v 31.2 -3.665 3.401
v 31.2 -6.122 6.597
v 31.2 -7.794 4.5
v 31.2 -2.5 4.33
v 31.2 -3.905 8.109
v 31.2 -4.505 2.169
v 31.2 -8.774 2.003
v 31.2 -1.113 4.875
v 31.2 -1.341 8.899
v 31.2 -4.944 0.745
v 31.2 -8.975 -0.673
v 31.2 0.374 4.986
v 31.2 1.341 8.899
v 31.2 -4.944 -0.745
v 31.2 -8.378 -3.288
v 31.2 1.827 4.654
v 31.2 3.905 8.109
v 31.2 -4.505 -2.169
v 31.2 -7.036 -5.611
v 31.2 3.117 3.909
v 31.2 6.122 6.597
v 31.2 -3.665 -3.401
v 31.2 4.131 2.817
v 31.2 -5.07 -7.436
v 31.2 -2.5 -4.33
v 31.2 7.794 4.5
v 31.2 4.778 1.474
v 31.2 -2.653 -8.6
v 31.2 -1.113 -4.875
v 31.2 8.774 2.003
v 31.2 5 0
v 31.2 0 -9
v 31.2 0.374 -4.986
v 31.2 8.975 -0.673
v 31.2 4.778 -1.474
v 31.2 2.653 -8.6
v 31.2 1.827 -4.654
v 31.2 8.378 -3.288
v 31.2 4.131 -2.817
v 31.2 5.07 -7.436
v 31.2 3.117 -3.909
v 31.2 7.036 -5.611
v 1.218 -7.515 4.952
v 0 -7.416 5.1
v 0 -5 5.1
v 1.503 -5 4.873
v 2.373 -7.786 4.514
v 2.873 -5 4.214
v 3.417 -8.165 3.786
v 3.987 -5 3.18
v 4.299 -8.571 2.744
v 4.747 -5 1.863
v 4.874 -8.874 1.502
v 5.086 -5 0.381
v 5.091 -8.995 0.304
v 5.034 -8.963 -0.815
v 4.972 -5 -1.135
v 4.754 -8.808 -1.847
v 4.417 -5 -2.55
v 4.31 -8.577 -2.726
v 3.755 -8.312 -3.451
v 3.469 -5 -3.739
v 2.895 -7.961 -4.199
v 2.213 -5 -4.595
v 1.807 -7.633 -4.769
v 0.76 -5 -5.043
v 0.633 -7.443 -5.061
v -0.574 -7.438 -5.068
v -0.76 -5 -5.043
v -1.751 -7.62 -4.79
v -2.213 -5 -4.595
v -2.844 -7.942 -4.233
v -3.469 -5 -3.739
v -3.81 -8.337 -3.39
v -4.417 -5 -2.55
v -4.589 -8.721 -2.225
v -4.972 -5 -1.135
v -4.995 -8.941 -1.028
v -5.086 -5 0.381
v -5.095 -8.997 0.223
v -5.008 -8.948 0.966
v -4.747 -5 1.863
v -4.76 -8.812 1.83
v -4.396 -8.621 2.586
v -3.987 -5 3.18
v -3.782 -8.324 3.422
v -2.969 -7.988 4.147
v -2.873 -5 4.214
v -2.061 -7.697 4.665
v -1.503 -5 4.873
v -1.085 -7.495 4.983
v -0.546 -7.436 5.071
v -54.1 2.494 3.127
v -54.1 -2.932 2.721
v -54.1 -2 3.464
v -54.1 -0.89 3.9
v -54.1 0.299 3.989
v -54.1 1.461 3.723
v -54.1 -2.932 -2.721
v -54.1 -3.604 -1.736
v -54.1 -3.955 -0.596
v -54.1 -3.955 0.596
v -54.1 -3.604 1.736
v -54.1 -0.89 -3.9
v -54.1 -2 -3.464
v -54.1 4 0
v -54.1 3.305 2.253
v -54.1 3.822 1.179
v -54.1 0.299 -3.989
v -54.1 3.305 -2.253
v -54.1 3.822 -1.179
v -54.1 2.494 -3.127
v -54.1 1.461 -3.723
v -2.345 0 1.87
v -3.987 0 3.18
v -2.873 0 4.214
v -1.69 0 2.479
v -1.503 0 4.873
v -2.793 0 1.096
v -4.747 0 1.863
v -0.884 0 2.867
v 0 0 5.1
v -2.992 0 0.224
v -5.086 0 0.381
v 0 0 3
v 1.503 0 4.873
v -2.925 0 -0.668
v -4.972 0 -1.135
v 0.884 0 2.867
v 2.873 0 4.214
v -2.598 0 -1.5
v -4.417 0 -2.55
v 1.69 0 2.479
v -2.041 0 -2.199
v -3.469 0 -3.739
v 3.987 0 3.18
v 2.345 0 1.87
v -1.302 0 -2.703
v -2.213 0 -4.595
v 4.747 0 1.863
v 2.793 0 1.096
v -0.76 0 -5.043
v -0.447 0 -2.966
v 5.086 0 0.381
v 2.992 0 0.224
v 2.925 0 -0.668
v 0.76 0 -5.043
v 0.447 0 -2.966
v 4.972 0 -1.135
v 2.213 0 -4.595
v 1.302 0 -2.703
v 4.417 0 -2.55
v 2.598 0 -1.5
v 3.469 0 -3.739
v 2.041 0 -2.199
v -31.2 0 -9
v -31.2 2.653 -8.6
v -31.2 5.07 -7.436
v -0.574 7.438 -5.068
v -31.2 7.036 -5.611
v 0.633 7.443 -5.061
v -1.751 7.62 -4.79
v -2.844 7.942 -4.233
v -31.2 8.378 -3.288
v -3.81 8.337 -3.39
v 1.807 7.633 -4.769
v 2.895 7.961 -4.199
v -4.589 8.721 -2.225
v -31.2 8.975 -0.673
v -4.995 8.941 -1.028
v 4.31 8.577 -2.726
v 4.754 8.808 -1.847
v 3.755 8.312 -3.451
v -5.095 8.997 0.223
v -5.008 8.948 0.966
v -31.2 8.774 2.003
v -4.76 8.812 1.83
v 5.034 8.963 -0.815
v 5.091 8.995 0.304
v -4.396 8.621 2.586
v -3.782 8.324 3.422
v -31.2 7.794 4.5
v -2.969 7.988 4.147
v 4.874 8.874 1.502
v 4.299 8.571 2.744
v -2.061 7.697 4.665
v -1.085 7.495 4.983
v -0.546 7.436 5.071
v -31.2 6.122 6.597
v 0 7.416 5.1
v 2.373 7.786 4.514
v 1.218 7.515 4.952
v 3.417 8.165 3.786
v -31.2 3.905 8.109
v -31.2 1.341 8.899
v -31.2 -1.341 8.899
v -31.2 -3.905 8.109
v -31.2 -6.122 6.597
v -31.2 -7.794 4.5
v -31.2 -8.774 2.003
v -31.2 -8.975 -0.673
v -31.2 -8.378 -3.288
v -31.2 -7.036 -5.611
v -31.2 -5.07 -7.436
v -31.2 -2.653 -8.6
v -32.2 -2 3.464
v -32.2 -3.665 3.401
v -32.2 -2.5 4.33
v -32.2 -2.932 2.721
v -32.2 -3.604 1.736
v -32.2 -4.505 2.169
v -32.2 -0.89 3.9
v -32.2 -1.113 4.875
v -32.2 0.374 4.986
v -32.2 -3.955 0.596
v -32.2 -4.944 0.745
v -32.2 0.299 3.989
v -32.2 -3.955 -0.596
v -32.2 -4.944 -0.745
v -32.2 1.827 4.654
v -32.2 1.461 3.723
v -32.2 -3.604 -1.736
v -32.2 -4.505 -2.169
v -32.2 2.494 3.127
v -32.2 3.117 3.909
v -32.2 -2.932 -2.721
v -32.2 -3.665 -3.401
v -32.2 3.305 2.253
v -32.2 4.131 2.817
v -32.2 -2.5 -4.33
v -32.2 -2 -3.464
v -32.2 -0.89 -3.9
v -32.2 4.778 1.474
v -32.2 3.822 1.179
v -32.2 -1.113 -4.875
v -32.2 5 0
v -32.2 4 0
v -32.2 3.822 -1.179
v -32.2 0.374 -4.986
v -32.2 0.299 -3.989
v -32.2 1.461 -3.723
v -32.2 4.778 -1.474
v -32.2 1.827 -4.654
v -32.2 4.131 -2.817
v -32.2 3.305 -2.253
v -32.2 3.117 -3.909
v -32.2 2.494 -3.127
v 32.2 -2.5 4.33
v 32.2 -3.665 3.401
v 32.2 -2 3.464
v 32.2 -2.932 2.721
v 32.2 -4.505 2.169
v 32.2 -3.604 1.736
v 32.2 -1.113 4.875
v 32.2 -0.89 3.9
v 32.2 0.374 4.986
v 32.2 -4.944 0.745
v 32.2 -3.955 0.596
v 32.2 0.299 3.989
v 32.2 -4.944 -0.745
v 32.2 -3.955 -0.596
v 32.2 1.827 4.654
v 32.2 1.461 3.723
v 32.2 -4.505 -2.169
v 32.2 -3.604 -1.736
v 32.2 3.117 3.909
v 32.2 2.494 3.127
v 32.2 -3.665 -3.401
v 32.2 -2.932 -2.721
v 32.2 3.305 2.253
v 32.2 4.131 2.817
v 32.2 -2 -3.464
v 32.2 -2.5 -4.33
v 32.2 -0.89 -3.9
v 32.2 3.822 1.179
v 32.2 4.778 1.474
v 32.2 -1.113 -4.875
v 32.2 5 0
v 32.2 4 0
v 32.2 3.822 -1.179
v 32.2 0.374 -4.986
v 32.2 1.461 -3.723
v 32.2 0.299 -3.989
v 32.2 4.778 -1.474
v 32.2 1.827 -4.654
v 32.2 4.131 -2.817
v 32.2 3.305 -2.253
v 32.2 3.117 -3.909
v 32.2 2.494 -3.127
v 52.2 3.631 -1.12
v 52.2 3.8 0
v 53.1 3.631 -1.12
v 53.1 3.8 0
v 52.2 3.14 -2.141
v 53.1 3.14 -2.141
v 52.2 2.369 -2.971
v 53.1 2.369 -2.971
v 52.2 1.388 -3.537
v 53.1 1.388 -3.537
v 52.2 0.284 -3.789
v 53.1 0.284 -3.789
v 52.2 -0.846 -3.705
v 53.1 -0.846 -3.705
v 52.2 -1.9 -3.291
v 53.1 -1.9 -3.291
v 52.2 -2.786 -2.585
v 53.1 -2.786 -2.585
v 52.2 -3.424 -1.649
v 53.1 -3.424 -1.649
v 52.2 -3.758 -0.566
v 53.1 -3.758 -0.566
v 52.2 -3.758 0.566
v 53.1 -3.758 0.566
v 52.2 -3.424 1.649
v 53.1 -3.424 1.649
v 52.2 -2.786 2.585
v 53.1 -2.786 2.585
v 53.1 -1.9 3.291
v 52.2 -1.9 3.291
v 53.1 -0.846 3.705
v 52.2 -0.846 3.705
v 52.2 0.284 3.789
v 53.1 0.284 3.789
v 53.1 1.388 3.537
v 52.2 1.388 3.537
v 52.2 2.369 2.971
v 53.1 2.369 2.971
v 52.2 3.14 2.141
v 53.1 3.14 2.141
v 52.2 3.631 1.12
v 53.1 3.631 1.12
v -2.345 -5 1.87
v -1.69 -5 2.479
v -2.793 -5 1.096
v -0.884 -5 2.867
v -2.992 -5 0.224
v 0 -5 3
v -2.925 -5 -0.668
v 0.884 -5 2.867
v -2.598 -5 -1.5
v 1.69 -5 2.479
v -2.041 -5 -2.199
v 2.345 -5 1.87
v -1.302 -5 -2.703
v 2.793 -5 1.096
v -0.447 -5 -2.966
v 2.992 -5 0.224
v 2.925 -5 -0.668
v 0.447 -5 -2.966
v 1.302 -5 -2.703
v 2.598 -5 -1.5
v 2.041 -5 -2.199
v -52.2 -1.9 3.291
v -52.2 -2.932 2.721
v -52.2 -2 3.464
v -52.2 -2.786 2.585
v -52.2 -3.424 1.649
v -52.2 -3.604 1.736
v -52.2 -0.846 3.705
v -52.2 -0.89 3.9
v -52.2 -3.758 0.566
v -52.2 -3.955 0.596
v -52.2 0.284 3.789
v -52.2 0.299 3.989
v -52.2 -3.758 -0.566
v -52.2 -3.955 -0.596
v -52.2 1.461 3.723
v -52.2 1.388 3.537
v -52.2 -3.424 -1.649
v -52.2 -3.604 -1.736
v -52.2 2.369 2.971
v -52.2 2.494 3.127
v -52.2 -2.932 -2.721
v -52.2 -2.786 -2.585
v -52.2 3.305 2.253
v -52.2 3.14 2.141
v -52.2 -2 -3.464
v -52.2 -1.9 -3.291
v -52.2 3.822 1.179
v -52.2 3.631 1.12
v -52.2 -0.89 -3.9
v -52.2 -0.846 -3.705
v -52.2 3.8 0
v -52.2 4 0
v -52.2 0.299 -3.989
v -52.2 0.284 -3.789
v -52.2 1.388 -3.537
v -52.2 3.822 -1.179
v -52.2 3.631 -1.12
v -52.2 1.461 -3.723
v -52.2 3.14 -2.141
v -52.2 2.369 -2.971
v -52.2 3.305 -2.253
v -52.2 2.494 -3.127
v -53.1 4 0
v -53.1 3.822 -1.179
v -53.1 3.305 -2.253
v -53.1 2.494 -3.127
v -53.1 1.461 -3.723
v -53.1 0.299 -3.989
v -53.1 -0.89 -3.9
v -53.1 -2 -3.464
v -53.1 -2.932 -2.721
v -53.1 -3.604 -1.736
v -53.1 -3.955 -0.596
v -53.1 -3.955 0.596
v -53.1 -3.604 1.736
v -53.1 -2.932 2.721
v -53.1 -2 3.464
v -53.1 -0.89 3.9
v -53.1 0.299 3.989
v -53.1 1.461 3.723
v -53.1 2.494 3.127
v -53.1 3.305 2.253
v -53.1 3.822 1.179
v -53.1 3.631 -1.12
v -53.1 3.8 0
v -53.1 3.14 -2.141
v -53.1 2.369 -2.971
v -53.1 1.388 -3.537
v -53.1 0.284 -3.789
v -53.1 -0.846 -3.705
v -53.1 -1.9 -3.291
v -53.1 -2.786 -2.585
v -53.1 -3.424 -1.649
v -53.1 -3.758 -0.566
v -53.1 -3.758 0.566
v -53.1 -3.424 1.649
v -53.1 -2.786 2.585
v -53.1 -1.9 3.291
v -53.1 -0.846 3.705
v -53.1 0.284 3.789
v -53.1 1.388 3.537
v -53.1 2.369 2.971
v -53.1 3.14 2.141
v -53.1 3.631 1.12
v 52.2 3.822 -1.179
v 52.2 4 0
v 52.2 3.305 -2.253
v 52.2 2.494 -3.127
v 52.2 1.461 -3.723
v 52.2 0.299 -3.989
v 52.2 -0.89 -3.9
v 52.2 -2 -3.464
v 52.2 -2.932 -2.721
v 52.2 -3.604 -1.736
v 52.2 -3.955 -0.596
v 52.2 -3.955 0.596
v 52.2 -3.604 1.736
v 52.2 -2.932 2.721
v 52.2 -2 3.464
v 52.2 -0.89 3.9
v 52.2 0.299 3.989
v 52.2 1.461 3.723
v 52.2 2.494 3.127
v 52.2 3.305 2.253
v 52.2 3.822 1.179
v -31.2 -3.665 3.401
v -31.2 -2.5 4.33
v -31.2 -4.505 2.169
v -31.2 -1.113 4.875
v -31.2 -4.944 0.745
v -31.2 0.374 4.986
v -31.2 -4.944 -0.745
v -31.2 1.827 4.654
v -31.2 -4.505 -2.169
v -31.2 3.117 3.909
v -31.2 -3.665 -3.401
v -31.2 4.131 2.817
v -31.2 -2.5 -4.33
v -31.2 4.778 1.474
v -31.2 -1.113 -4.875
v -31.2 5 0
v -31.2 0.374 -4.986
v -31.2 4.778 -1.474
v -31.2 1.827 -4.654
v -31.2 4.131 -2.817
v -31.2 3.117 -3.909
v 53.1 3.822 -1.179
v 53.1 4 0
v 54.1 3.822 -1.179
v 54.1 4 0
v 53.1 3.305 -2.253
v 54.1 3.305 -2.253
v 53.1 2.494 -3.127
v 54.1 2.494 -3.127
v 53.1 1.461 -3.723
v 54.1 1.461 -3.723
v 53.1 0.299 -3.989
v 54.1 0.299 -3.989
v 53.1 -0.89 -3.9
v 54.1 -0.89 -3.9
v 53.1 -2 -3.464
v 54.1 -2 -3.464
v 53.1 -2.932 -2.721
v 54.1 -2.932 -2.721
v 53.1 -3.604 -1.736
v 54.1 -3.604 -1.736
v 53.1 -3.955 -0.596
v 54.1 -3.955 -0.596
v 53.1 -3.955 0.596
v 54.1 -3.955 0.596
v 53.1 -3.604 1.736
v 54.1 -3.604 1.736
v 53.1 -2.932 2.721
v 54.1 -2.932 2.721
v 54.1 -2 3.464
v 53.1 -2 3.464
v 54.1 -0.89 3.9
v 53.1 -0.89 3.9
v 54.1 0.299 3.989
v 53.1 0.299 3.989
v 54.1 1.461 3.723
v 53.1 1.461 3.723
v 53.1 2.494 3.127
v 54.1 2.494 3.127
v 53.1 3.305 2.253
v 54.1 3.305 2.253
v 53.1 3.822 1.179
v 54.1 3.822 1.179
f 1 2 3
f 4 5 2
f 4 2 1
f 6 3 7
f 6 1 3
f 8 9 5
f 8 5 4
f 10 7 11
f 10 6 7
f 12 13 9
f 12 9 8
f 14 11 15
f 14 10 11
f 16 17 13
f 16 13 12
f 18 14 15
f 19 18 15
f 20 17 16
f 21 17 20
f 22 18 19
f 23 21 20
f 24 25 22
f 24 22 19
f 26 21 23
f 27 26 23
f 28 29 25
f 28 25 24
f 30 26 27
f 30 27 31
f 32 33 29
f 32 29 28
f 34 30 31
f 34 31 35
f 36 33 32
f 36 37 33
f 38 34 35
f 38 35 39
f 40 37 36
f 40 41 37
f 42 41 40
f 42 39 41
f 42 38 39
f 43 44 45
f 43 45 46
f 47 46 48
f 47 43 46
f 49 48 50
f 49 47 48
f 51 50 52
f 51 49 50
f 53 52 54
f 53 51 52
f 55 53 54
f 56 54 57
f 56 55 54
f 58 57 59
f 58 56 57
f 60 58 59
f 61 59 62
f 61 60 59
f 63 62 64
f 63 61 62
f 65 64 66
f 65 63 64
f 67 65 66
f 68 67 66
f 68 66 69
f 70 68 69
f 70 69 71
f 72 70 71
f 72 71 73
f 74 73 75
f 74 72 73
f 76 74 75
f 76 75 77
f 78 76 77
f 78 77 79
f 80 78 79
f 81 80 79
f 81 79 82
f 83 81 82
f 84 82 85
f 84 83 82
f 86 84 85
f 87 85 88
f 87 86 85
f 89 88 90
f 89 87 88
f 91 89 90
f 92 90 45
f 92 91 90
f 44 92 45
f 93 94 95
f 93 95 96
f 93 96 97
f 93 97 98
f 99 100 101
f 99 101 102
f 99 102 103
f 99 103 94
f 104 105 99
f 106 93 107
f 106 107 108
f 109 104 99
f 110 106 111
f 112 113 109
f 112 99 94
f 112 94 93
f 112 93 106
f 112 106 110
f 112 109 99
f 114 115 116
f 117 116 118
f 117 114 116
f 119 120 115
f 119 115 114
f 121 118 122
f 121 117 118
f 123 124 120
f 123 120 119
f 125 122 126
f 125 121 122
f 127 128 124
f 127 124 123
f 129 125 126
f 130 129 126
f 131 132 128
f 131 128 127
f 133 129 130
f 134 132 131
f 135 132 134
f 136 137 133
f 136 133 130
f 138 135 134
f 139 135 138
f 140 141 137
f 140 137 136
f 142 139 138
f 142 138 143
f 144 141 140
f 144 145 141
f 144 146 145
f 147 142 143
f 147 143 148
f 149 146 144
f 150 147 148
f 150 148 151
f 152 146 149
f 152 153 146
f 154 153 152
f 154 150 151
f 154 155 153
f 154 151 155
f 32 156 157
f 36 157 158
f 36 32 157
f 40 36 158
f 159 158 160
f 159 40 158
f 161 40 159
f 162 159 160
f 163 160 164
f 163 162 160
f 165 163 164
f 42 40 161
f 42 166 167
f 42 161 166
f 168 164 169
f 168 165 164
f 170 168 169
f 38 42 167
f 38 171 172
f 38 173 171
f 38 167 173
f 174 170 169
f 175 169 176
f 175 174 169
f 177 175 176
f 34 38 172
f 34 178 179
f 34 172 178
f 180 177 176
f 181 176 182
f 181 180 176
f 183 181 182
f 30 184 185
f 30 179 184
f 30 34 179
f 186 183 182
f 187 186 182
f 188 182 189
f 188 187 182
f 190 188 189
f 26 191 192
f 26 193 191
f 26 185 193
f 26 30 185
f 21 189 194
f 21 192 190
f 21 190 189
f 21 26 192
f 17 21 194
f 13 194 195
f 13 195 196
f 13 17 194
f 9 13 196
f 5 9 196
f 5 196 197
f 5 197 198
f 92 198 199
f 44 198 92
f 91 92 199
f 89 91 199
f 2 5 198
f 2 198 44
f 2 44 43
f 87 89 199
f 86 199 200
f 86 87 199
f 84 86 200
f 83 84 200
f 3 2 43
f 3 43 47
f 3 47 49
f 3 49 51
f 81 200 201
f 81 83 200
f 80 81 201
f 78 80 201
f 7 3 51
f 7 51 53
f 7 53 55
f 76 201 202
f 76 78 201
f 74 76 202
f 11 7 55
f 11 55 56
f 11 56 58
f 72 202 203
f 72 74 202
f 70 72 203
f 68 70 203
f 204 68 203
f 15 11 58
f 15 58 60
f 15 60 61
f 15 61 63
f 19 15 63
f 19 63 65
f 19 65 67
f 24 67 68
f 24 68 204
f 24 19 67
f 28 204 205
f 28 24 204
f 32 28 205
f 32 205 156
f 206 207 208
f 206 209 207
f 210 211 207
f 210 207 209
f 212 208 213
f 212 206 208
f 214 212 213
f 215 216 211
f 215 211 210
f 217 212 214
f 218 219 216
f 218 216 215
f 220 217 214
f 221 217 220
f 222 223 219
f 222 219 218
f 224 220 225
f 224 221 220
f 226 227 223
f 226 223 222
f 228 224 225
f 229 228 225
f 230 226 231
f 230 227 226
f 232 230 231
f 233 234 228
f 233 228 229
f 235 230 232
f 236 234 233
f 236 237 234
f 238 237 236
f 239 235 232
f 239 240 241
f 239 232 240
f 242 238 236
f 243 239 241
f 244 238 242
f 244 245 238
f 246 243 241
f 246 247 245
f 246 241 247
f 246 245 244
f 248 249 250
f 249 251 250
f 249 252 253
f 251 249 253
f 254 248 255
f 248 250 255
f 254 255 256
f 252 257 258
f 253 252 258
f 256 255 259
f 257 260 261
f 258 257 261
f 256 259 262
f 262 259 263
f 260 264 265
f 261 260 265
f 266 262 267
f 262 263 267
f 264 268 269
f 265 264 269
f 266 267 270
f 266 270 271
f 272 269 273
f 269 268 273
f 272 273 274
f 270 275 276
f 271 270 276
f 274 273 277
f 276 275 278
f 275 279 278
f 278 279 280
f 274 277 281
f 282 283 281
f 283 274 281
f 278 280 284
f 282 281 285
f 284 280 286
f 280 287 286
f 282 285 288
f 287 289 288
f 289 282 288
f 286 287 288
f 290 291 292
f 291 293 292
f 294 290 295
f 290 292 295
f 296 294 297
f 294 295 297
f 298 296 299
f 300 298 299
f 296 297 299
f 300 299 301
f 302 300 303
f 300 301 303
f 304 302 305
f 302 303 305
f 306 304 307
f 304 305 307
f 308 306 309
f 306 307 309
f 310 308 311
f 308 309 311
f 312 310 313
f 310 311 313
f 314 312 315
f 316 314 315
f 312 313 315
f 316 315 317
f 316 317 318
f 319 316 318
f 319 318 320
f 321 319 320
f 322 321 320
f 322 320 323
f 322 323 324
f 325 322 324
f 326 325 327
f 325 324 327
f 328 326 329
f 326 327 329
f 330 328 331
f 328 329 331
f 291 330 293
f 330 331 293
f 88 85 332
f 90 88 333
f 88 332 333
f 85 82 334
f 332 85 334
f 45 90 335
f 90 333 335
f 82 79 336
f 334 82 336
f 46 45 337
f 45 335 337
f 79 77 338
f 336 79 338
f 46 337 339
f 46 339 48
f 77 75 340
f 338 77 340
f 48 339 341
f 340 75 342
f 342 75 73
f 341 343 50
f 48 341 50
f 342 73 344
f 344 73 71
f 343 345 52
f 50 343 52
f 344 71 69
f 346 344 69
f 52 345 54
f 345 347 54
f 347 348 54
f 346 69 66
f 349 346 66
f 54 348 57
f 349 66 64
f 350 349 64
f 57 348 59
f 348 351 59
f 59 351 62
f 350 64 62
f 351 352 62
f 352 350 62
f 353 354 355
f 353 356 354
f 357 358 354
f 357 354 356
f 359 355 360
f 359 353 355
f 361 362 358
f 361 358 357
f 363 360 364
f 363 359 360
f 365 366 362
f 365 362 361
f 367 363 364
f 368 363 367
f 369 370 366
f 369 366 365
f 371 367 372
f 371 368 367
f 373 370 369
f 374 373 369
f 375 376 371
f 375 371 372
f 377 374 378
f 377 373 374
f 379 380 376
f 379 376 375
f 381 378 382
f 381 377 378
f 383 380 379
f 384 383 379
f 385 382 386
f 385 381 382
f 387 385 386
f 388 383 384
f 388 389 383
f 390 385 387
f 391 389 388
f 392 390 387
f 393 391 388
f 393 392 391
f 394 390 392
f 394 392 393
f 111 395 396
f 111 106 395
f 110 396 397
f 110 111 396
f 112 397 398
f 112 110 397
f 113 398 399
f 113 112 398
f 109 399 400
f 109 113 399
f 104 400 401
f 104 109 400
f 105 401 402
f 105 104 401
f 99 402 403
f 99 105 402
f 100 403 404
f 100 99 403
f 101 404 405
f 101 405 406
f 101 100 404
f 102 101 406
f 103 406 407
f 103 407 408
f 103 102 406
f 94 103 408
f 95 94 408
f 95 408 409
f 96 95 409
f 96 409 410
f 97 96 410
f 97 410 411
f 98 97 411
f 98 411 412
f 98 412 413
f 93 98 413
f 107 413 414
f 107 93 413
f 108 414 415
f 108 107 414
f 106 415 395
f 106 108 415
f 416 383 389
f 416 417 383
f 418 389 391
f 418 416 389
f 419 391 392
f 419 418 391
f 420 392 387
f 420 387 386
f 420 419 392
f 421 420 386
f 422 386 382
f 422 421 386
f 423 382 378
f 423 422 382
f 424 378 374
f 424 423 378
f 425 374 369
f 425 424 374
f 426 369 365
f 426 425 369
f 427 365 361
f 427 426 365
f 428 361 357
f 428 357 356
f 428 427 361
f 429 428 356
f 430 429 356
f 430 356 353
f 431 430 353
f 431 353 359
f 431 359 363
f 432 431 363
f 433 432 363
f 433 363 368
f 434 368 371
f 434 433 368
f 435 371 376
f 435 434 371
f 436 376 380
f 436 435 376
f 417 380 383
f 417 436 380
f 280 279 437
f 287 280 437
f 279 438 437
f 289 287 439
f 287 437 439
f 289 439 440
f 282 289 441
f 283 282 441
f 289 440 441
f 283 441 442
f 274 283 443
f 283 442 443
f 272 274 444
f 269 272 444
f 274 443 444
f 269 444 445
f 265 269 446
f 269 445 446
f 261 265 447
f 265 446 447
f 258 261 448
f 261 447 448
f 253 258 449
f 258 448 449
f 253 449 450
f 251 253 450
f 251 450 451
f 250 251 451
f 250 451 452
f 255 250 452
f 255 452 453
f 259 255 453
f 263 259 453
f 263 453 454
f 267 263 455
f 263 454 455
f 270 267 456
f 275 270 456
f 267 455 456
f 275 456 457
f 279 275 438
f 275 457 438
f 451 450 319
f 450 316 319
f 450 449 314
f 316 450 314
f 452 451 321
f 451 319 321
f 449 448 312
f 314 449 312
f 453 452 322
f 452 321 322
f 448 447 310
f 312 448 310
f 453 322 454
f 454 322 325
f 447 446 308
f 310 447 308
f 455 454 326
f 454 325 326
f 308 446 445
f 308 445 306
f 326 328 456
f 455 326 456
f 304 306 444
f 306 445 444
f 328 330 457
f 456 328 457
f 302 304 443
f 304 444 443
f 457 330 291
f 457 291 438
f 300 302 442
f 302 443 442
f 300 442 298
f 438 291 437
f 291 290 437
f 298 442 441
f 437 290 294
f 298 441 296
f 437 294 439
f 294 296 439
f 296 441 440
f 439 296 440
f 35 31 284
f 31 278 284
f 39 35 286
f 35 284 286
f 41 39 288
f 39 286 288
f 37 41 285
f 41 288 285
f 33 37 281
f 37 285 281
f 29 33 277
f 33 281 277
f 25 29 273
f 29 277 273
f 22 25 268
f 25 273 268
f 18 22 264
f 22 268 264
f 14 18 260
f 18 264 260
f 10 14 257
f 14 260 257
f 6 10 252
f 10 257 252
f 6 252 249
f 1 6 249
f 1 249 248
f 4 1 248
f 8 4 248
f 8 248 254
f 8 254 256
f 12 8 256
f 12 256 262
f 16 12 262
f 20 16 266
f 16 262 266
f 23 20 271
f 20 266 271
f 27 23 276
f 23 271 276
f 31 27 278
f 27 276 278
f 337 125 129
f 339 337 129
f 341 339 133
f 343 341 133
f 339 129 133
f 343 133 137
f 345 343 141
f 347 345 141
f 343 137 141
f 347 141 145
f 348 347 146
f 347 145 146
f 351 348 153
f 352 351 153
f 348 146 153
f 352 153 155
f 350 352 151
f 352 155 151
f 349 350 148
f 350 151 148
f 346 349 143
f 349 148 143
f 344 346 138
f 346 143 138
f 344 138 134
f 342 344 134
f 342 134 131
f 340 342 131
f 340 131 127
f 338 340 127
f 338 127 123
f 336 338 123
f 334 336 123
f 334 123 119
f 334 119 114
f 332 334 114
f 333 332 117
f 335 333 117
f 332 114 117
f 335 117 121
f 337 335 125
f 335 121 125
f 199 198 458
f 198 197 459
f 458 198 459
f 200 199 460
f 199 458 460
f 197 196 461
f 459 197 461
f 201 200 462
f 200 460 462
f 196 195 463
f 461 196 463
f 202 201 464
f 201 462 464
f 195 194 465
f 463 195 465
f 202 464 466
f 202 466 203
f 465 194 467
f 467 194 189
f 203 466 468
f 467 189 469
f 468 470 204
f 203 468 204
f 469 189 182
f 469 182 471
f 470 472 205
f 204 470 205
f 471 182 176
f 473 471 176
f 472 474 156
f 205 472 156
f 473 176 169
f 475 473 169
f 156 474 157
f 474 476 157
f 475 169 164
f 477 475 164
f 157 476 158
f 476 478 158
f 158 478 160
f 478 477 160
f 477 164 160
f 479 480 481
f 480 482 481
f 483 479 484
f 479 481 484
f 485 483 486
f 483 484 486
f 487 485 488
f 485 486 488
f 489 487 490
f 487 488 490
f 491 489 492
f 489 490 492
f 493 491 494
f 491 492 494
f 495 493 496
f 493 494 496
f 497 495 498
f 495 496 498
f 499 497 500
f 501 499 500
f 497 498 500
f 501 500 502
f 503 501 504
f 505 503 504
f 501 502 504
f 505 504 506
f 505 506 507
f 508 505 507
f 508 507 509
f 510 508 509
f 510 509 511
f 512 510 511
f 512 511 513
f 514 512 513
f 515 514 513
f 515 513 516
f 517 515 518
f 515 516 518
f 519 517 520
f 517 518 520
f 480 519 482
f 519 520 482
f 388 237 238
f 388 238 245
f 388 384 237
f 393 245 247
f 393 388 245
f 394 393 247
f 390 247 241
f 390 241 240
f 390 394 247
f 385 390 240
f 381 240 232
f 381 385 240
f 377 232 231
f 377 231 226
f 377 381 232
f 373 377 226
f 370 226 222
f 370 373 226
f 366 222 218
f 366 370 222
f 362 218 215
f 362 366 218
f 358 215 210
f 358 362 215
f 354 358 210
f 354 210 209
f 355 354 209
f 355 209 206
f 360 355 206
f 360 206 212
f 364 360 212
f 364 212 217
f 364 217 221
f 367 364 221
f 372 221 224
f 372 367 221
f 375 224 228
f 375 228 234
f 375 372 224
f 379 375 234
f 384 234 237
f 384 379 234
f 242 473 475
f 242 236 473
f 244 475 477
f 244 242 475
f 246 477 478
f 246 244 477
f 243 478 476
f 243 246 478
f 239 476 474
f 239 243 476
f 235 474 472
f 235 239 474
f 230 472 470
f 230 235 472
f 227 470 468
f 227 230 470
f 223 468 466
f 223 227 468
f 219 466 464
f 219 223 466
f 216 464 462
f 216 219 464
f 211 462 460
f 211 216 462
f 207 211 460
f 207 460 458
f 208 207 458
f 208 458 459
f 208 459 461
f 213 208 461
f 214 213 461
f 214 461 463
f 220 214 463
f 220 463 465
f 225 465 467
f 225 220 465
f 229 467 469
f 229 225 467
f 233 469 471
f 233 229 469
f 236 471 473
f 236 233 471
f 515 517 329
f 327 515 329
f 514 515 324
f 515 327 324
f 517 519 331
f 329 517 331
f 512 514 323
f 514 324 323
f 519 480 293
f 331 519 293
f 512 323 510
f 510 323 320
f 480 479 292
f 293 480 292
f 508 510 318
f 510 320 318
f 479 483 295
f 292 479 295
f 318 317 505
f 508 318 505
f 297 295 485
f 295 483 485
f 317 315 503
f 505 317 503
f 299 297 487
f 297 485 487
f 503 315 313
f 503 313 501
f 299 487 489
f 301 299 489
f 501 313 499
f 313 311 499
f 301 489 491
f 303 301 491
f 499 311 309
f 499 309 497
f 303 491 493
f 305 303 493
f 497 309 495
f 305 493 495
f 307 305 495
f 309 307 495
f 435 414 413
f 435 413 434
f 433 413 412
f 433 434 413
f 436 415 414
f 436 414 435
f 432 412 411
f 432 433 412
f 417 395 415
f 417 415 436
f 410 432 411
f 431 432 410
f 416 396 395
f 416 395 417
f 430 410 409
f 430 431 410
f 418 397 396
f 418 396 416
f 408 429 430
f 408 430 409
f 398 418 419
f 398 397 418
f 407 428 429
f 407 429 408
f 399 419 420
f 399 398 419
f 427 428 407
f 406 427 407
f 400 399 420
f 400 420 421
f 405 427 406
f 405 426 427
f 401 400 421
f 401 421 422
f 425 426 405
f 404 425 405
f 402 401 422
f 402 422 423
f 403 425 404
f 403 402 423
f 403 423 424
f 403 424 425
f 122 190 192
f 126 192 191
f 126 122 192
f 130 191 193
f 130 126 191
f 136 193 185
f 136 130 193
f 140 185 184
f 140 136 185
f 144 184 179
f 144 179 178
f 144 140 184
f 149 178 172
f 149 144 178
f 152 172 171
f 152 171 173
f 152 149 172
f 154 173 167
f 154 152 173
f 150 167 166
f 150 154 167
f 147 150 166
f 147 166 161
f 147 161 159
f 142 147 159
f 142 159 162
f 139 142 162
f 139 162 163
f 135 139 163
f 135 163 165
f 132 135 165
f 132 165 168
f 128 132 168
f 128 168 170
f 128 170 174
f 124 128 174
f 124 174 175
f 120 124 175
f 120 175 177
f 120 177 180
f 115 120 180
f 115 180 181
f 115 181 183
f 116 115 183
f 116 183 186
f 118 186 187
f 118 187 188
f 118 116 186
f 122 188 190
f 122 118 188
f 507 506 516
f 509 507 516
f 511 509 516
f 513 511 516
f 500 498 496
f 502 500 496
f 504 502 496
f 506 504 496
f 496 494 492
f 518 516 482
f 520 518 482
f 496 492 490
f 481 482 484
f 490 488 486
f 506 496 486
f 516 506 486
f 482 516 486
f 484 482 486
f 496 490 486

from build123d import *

# Parameters (mm, degrees)
SKETCH1_R               = 9
BOSS_EXTRUDE1_DEPTH     = 31.2
CUT_EXTRUDE1_DEPTH      = 34.696290597
CUT_EXTRUDE1_DEPTH_BACK = 34.696290597
SKETCH2_R               = 5.1
SKETCH7_R               = 5.25
SKETCH7_R_2             = 3
BOSS_EXTRUDE2_DEPTH     = 5


with BuildPart() as part:
    # Sketch1 → Boss-Extrude1 (new, symmetric)
    with BuildSketch(Plane(origin=(0, 0, 0), x_dir=(0, 0, -1), z_dir=(1, 0, 0))):
        Circle(SKETCH1_R)
    extrude(amount=BOSS_EXTRUDE1_DEPTH, both=True)

    # Sketch2 → Cut-Extrude1 (cut, two sides: drawn at the far end of the back side and taken through both)
    with BuildSketch(Plane(origin=(0, 0, 0), x_dir=(1, 0, 0), z_dir=(0, 1, 0)).offset(-CUT_EXTRUDE1_DEPTH_BACK)):
        with Locations(Location((0, 0, 0), (0, 0, 270))):
            Circle(SKETCH2_R)
    extrude(amount=CUT_EXTRUDE1_DEPTH + CUT_EXTRUDE1_DEPTH_BACK, mode=Mode.SUBTRACT)

    # Sketch6 → Revolve1 (revolve)
    with BuildSketch(Plane.XY):
        Polygon((31.2, 0), (31.2, 5), (32.2, 5), (32.2, 4), (52.2, 4), (52.2, 3.8), (53.1, 3.8), (53.1, 4), (54.1, 4), (54.1, 0), align=None)
    revolve1 = revolve(axis=Axis((54.1, 0, 0), (-1, 0, 0)))

    # Mirror1: Revolve1 across plane
    add(revolve1.mirror(Plane(origin=(0, 0, 0), x_dir=(0, 0, 1), z_dir=(1, 0, 0))))

    # Sketch7 → Boss-Extrude2 (add)
    with BuildSketch(Plane(origin=(0, 0, 0), x_dir=(1, 0, 0), z_dir=(0, 1, 0))):
        Circle(SKETCH7_R)
        with Locations(Location((0, 0, 0), (0, 0, 270))):
            Circle(SKETCH7_R_2, mode=Mode.SUBTRACT)
    extrude(amount=-BOSS_EXTRUDE2_DEPTH)


solid = part.part
